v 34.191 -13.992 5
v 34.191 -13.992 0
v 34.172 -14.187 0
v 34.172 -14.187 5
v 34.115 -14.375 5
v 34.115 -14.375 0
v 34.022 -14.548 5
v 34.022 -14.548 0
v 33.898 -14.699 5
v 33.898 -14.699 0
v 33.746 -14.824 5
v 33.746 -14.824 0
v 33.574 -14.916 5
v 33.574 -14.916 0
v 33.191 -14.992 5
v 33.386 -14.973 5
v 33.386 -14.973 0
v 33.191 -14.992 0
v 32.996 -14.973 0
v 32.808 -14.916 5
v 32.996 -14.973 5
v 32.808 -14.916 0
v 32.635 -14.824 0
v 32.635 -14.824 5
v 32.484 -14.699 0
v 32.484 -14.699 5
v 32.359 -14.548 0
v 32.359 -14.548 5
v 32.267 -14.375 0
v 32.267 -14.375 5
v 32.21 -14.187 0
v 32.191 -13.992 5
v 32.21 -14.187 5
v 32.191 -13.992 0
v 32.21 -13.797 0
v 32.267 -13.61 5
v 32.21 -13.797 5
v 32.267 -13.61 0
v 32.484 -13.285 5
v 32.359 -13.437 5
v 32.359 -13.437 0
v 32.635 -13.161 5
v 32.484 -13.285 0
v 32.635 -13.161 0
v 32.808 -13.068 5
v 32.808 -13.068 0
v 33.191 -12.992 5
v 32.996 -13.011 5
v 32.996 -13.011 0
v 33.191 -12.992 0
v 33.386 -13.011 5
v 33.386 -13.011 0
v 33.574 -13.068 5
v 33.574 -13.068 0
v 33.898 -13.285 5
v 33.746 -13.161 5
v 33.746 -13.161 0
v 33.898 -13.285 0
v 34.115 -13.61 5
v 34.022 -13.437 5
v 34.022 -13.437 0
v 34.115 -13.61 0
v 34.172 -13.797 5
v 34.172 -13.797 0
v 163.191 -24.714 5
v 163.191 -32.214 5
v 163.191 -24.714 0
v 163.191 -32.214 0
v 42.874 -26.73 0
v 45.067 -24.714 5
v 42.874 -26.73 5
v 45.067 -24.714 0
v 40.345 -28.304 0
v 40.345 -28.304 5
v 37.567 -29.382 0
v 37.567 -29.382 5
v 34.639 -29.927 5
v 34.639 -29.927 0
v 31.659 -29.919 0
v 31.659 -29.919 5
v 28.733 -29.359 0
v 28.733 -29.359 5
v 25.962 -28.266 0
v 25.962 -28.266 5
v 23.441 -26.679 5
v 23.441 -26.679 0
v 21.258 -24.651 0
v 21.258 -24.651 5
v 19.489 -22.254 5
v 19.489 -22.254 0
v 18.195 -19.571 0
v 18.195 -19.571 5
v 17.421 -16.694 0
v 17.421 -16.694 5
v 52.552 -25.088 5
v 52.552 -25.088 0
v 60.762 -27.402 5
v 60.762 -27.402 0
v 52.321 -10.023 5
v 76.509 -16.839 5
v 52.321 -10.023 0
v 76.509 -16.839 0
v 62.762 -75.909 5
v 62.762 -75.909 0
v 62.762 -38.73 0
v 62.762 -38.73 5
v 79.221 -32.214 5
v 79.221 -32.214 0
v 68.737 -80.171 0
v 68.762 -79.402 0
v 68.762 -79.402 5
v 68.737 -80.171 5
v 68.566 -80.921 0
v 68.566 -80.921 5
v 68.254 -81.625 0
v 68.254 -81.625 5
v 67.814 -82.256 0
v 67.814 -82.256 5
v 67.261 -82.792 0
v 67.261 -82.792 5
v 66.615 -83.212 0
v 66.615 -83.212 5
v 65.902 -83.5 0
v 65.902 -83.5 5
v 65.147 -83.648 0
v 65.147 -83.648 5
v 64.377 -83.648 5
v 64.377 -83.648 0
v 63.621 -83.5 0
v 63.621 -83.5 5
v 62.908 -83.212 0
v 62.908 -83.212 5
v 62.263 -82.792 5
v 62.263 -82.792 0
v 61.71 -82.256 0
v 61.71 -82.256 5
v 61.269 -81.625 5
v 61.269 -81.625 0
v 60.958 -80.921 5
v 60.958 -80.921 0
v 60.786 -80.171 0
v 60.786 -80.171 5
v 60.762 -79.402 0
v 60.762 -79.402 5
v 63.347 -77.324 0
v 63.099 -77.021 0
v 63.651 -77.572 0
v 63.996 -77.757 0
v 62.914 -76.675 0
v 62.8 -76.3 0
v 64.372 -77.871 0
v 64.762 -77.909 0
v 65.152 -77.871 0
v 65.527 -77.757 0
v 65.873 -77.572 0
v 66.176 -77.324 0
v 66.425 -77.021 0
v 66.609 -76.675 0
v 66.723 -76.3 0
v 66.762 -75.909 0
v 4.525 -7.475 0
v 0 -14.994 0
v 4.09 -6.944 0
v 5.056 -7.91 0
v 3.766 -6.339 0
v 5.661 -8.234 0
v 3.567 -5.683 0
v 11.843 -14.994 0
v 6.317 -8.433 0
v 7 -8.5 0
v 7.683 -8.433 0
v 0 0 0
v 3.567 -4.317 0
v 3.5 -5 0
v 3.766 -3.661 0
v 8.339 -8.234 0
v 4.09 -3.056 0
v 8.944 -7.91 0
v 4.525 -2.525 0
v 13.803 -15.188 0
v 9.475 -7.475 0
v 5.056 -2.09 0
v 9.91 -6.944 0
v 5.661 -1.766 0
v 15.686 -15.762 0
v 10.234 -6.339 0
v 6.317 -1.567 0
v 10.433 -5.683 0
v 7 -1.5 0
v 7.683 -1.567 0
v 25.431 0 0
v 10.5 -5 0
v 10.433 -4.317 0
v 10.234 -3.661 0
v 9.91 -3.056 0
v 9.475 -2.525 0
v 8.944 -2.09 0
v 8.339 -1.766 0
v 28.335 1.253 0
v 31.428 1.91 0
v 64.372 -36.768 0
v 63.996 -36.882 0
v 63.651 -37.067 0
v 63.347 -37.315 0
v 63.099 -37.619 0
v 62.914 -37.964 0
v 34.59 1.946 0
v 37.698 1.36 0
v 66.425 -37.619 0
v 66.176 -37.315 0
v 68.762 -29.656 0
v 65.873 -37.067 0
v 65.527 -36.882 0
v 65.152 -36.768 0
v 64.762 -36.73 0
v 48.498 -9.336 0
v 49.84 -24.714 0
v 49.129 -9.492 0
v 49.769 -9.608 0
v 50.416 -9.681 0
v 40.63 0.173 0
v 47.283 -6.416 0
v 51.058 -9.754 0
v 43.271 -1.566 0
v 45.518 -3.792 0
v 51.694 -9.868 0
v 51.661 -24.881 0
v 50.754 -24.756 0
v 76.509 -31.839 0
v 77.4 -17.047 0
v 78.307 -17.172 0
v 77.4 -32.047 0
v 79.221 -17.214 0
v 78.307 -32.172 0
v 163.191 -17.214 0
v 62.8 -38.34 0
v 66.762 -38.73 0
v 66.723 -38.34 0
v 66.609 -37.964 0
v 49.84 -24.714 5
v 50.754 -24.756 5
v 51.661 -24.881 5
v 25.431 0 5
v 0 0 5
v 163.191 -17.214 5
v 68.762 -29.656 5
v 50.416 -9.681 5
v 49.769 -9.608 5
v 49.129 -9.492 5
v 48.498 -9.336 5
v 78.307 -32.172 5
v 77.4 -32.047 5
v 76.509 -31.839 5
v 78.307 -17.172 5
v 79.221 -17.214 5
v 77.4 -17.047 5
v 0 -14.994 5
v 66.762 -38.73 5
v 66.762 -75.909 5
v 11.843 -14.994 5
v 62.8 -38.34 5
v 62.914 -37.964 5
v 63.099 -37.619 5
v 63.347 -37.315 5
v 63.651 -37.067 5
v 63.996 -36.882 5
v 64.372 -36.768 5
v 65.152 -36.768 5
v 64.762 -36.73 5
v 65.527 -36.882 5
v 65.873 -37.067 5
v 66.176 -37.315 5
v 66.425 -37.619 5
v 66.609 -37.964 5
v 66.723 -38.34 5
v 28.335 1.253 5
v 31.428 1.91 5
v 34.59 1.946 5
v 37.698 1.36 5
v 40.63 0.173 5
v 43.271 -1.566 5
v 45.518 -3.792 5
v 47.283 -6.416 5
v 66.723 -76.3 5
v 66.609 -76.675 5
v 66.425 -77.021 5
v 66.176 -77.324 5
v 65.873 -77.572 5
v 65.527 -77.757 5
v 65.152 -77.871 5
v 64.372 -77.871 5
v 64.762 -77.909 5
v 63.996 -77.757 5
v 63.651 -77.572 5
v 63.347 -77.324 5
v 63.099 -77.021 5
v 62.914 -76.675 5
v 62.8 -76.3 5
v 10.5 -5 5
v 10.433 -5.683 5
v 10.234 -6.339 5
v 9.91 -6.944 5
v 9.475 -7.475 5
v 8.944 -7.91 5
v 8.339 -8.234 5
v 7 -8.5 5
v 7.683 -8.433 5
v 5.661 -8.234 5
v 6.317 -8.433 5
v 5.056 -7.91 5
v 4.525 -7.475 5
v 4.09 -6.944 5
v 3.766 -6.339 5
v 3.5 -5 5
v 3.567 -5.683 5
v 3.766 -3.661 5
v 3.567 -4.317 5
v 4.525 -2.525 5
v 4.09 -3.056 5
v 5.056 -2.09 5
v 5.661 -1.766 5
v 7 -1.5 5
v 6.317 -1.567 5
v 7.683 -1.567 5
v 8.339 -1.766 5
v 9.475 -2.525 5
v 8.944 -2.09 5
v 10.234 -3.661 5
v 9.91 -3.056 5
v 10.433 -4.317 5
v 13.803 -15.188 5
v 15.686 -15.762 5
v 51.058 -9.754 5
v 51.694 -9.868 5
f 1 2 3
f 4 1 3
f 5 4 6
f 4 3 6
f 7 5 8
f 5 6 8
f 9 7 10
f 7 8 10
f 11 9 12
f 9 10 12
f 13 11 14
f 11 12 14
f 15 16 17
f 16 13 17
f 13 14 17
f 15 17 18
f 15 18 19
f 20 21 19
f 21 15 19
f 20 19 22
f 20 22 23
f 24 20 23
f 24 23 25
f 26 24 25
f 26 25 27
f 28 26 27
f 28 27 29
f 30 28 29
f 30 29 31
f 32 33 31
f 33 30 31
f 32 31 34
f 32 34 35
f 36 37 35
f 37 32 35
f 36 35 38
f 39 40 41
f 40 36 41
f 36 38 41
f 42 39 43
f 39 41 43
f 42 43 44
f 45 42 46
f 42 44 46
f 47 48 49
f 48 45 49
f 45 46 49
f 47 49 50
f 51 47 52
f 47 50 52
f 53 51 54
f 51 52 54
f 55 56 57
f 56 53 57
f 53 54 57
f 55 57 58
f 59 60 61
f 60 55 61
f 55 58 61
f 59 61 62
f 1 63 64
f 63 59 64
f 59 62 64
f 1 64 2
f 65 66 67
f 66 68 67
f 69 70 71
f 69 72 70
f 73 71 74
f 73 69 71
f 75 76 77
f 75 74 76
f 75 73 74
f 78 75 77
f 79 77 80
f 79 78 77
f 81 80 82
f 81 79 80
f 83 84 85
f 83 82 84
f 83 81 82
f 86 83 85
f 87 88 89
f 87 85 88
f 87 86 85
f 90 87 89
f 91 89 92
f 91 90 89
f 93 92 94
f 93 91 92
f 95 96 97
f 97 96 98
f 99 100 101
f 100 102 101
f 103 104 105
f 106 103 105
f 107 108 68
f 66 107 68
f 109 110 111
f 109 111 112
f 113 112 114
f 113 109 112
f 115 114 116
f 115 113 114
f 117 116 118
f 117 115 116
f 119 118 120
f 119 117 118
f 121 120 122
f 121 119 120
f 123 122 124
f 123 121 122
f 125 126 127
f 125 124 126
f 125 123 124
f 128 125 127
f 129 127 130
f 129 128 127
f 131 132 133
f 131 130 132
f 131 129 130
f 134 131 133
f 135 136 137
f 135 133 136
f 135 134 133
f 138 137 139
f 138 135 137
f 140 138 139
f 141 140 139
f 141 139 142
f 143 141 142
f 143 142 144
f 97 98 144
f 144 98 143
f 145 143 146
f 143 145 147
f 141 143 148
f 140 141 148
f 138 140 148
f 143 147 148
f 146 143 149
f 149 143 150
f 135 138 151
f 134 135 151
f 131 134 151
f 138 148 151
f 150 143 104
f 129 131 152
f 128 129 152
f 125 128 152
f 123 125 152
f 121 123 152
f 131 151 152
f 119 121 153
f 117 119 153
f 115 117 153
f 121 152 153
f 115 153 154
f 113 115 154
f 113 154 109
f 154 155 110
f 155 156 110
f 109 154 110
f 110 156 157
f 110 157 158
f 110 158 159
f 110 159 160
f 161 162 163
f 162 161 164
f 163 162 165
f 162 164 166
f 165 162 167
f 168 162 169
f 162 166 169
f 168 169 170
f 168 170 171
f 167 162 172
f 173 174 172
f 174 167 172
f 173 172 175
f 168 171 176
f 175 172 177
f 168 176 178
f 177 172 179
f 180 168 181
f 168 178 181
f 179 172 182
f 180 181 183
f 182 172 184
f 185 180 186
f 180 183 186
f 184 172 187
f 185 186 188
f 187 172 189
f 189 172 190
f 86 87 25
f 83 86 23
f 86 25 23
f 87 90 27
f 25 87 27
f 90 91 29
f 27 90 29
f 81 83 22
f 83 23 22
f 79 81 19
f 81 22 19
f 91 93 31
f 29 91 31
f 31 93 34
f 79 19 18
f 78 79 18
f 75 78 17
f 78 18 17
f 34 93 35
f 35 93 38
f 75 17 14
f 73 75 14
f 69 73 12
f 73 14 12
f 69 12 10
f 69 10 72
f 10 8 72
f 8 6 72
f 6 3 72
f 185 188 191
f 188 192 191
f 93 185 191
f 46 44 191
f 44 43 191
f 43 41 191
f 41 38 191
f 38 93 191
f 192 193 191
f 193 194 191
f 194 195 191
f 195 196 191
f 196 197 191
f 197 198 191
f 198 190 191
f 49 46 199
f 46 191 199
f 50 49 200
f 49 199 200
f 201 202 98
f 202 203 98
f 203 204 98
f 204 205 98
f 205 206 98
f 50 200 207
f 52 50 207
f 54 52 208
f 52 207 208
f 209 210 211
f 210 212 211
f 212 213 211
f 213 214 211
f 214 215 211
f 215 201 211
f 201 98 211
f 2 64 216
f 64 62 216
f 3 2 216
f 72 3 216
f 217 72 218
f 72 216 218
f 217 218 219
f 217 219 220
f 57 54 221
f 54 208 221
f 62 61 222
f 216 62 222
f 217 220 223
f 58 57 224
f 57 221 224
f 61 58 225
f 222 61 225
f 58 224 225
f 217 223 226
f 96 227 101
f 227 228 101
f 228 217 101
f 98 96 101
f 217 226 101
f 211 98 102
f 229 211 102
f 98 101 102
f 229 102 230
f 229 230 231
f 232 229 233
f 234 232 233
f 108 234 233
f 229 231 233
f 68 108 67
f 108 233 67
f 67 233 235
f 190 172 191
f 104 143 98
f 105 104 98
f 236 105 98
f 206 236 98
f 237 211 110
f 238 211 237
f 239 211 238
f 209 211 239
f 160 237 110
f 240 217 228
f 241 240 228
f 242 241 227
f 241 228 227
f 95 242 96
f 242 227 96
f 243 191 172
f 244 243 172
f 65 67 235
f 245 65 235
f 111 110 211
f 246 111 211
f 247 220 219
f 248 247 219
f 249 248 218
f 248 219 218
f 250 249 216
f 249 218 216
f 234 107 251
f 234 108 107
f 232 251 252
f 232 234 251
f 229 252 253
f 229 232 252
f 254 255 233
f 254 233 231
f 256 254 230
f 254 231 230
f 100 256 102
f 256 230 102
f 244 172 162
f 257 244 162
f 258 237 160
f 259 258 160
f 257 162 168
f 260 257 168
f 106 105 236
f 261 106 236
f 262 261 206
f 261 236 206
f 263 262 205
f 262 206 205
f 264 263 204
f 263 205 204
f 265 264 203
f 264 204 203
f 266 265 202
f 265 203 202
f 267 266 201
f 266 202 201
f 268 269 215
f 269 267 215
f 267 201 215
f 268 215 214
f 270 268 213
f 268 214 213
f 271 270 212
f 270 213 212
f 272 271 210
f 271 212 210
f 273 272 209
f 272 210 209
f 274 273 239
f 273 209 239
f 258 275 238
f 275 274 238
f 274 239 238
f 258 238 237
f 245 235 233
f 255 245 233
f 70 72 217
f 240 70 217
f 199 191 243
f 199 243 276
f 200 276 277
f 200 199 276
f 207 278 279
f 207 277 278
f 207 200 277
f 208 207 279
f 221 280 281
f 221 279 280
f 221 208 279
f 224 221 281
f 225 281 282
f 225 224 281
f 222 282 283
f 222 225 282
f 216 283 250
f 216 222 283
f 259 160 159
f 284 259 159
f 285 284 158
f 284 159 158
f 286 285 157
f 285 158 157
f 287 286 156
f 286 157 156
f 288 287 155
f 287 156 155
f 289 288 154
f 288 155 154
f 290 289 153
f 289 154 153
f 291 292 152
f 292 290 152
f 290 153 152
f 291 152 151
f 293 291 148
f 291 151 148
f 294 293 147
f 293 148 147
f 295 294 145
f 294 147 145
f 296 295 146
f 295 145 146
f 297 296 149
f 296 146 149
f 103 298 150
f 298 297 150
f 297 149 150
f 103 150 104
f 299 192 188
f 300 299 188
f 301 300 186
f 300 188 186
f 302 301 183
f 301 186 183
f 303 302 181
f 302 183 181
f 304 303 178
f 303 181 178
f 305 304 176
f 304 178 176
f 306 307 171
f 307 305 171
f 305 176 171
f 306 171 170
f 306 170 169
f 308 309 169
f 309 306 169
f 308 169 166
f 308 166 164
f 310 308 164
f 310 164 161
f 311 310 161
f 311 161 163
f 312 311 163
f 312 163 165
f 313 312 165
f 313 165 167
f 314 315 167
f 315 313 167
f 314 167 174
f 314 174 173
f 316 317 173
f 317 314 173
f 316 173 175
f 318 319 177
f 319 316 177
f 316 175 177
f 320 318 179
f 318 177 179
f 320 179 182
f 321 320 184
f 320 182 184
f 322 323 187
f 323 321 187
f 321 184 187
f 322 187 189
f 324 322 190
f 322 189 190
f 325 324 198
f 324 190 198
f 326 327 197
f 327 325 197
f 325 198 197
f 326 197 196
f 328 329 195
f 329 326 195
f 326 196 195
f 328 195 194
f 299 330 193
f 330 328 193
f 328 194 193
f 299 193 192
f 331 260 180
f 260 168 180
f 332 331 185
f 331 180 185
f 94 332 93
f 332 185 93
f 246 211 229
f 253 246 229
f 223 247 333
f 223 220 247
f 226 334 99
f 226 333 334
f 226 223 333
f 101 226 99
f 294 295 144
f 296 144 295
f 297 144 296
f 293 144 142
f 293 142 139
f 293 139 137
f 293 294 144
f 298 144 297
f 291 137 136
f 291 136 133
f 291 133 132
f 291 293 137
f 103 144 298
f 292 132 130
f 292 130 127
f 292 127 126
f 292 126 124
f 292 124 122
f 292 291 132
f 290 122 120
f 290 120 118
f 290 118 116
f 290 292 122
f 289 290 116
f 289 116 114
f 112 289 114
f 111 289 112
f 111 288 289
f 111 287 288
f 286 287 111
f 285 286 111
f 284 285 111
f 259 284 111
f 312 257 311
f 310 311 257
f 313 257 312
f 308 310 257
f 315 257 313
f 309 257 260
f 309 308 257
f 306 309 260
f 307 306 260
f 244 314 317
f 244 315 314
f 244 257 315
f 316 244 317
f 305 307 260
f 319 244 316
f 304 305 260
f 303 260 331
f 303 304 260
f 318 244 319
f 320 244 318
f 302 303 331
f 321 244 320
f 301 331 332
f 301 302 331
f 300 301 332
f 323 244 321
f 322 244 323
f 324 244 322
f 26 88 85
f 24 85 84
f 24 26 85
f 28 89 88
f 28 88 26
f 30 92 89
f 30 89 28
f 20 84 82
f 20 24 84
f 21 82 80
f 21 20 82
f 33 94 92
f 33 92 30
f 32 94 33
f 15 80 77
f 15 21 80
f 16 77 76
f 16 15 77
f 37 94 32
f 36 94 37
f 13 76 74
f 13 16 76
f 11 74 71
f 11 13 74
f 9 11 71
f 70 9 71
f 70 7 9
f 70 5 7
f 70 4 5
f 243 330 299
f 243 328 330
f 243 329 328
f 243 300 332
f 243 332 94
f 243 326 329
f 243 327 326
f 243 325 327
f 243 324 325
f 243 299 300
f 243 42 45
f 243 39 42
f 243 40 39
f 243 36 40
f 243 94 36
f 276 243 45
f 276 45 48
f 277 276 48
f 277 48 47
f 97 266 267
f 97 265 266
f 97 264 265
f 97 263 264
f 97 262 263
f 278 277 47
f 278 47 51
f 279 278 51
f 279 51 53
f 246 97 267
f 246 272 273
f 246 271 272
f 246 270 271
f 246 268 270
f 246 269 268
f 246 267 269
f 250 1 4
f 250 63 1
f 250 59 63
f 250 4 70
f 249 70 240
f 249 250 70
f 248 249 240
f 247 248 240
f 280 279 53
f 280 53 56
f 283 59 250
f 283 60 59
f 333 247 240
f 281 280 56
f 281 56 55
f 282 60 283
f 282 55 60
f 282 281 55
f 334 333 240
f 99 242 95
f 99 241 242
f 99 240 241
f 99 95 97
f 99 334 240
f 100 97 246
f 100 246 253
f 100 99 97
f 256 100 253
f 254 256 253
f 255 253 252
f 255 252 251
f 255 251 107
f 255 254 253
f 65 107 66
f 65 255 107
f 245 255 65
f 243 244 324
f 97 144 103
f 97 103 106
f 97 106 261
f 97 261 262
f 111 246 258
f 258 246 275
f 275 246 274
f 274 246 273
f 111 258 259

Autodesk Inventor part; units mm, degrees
ref_plane "YZ Plane" through (0, 0, 0) normal (1, 0, 0) x (0, 1, 0)
ref_plane "XZ Plane" through (0, 0, 0) normal (0, 1, 0) x (-1, 0, 0)
ref_plane "XY Plane" through (0, 0, 0) normal (0, 0, 1) x (1, 0, 0)
sketch "Boceto1" plane through (0, 0, 0) normal (0, 0, 1) x (1, 0, 0)
  circle A0 centre (7, -5) radius 3.5
  arc A1 (66.7617, -38.7297) -> (62.7617, -38.7297) centre (64.7617, -38.7297) ccw
  line L0 (66.7617, -38.7297) -> (66.7617, -75.9094)
  arc A2 (62.7617, -75.9094) -> (66.7617, -75.9094) centre (64.7617, -75.9094) ccw
  line L1 (62.7617, -75.9094) -> (62.7617, -38.7297)
  line L2 (163.1909, -24.7137) -> (163.1909, -17.2137)
  line L3 (163.1909, -17.2137) -> (79.2209, -17.2137)
  arc A3 (76.5087, -16.8389) -> (79.2209, -17.2137) centre (79.2209, -7.2137) ccw
  line L4 (76.5087, -16.8389) -> (52.321, -10.0234)
  arc A4 (52.321, -10.0234) -> (50.4155, -9.6811) centre (49.6089, -19.6486) ccw
  arc A5 (48.4983, -9.3356) -> (50.4155, -9.6811) centre (51.2221, 0.2863) ccw
  arc A6 (17.4207, -16.6942) -> (45.0673, -24.7137) centre (33.1909, -13.9922) ccw
  line L5 (45.0673, -24.7137) -> (49.8402, -24.7137)
  arc A7 (52.5523, -25.0885) -> (49.8402, -24.7137) centre (49.8402, -34.7137) ccw
  line L6 (52.5523, -25.0885) -> (60.7617, -27.4017)
  line L7 (60.7617, -27.4017) -> (60.7617, -79.4017)
  arc A8 (60.7617, -79.4017) -> (68.7617, -79.4017) centre (64.7617, -79.6579) ccw
  line L8 (68.7617, -79.4017) -> (68.7617, -29.656)
  line L9 (68.7617, -29.656) -> (76.5087, -31.8389)
  arc A9 (76.5087, -31.8389) -> (79.2209, -32.2137) centre (79.2209, -22.2137) ccw
  line L10 (79.2209, -32.2137) -> (163.1909, -32.2137)
  line L11 (163.1909, -32.2137) -> (163.1909, -17.2137)
  line L12 (25.4308, 0) -> (0, 0)
  line L13 (0, 0) -> (0, -14.9941)
  line L14 (0, -14.9941) -> (11.843, -14.9941)
  arc A10 (17.4207, -16.6942) -> (11.843, -14.9941) centre (11.843, -24.9941) ccw
  arc A11 (48.4983, -9.3356) -> (25.4308, 0) centre (33.1909, -13.9922) ccw
  circle A12 centre (33.1909, -13.9922) radius 1
  point P0 (52.321, -10.0234)
  point P1 (50.4155, -9.6811)
  point P2 (48.4983, -9.3356)
  point P3 (11.843, -14.9941)
  point P4 (17.4207, -16.6942)
  point P5 (45.0673, -24.7137)
  point P6 (49.8402, -24.7137)
  point P7 (52.5523, -25.0885)
  point P8 (60.7617, -79.4017)
  point P9 (68.7617, -79.4017)
  point P10 (79.2209, -32.2137)
  dimension "d0" = 2
extrude "Extrusión1" add sketch "Boceto1" along normal blind 5
properties part number "P6"
